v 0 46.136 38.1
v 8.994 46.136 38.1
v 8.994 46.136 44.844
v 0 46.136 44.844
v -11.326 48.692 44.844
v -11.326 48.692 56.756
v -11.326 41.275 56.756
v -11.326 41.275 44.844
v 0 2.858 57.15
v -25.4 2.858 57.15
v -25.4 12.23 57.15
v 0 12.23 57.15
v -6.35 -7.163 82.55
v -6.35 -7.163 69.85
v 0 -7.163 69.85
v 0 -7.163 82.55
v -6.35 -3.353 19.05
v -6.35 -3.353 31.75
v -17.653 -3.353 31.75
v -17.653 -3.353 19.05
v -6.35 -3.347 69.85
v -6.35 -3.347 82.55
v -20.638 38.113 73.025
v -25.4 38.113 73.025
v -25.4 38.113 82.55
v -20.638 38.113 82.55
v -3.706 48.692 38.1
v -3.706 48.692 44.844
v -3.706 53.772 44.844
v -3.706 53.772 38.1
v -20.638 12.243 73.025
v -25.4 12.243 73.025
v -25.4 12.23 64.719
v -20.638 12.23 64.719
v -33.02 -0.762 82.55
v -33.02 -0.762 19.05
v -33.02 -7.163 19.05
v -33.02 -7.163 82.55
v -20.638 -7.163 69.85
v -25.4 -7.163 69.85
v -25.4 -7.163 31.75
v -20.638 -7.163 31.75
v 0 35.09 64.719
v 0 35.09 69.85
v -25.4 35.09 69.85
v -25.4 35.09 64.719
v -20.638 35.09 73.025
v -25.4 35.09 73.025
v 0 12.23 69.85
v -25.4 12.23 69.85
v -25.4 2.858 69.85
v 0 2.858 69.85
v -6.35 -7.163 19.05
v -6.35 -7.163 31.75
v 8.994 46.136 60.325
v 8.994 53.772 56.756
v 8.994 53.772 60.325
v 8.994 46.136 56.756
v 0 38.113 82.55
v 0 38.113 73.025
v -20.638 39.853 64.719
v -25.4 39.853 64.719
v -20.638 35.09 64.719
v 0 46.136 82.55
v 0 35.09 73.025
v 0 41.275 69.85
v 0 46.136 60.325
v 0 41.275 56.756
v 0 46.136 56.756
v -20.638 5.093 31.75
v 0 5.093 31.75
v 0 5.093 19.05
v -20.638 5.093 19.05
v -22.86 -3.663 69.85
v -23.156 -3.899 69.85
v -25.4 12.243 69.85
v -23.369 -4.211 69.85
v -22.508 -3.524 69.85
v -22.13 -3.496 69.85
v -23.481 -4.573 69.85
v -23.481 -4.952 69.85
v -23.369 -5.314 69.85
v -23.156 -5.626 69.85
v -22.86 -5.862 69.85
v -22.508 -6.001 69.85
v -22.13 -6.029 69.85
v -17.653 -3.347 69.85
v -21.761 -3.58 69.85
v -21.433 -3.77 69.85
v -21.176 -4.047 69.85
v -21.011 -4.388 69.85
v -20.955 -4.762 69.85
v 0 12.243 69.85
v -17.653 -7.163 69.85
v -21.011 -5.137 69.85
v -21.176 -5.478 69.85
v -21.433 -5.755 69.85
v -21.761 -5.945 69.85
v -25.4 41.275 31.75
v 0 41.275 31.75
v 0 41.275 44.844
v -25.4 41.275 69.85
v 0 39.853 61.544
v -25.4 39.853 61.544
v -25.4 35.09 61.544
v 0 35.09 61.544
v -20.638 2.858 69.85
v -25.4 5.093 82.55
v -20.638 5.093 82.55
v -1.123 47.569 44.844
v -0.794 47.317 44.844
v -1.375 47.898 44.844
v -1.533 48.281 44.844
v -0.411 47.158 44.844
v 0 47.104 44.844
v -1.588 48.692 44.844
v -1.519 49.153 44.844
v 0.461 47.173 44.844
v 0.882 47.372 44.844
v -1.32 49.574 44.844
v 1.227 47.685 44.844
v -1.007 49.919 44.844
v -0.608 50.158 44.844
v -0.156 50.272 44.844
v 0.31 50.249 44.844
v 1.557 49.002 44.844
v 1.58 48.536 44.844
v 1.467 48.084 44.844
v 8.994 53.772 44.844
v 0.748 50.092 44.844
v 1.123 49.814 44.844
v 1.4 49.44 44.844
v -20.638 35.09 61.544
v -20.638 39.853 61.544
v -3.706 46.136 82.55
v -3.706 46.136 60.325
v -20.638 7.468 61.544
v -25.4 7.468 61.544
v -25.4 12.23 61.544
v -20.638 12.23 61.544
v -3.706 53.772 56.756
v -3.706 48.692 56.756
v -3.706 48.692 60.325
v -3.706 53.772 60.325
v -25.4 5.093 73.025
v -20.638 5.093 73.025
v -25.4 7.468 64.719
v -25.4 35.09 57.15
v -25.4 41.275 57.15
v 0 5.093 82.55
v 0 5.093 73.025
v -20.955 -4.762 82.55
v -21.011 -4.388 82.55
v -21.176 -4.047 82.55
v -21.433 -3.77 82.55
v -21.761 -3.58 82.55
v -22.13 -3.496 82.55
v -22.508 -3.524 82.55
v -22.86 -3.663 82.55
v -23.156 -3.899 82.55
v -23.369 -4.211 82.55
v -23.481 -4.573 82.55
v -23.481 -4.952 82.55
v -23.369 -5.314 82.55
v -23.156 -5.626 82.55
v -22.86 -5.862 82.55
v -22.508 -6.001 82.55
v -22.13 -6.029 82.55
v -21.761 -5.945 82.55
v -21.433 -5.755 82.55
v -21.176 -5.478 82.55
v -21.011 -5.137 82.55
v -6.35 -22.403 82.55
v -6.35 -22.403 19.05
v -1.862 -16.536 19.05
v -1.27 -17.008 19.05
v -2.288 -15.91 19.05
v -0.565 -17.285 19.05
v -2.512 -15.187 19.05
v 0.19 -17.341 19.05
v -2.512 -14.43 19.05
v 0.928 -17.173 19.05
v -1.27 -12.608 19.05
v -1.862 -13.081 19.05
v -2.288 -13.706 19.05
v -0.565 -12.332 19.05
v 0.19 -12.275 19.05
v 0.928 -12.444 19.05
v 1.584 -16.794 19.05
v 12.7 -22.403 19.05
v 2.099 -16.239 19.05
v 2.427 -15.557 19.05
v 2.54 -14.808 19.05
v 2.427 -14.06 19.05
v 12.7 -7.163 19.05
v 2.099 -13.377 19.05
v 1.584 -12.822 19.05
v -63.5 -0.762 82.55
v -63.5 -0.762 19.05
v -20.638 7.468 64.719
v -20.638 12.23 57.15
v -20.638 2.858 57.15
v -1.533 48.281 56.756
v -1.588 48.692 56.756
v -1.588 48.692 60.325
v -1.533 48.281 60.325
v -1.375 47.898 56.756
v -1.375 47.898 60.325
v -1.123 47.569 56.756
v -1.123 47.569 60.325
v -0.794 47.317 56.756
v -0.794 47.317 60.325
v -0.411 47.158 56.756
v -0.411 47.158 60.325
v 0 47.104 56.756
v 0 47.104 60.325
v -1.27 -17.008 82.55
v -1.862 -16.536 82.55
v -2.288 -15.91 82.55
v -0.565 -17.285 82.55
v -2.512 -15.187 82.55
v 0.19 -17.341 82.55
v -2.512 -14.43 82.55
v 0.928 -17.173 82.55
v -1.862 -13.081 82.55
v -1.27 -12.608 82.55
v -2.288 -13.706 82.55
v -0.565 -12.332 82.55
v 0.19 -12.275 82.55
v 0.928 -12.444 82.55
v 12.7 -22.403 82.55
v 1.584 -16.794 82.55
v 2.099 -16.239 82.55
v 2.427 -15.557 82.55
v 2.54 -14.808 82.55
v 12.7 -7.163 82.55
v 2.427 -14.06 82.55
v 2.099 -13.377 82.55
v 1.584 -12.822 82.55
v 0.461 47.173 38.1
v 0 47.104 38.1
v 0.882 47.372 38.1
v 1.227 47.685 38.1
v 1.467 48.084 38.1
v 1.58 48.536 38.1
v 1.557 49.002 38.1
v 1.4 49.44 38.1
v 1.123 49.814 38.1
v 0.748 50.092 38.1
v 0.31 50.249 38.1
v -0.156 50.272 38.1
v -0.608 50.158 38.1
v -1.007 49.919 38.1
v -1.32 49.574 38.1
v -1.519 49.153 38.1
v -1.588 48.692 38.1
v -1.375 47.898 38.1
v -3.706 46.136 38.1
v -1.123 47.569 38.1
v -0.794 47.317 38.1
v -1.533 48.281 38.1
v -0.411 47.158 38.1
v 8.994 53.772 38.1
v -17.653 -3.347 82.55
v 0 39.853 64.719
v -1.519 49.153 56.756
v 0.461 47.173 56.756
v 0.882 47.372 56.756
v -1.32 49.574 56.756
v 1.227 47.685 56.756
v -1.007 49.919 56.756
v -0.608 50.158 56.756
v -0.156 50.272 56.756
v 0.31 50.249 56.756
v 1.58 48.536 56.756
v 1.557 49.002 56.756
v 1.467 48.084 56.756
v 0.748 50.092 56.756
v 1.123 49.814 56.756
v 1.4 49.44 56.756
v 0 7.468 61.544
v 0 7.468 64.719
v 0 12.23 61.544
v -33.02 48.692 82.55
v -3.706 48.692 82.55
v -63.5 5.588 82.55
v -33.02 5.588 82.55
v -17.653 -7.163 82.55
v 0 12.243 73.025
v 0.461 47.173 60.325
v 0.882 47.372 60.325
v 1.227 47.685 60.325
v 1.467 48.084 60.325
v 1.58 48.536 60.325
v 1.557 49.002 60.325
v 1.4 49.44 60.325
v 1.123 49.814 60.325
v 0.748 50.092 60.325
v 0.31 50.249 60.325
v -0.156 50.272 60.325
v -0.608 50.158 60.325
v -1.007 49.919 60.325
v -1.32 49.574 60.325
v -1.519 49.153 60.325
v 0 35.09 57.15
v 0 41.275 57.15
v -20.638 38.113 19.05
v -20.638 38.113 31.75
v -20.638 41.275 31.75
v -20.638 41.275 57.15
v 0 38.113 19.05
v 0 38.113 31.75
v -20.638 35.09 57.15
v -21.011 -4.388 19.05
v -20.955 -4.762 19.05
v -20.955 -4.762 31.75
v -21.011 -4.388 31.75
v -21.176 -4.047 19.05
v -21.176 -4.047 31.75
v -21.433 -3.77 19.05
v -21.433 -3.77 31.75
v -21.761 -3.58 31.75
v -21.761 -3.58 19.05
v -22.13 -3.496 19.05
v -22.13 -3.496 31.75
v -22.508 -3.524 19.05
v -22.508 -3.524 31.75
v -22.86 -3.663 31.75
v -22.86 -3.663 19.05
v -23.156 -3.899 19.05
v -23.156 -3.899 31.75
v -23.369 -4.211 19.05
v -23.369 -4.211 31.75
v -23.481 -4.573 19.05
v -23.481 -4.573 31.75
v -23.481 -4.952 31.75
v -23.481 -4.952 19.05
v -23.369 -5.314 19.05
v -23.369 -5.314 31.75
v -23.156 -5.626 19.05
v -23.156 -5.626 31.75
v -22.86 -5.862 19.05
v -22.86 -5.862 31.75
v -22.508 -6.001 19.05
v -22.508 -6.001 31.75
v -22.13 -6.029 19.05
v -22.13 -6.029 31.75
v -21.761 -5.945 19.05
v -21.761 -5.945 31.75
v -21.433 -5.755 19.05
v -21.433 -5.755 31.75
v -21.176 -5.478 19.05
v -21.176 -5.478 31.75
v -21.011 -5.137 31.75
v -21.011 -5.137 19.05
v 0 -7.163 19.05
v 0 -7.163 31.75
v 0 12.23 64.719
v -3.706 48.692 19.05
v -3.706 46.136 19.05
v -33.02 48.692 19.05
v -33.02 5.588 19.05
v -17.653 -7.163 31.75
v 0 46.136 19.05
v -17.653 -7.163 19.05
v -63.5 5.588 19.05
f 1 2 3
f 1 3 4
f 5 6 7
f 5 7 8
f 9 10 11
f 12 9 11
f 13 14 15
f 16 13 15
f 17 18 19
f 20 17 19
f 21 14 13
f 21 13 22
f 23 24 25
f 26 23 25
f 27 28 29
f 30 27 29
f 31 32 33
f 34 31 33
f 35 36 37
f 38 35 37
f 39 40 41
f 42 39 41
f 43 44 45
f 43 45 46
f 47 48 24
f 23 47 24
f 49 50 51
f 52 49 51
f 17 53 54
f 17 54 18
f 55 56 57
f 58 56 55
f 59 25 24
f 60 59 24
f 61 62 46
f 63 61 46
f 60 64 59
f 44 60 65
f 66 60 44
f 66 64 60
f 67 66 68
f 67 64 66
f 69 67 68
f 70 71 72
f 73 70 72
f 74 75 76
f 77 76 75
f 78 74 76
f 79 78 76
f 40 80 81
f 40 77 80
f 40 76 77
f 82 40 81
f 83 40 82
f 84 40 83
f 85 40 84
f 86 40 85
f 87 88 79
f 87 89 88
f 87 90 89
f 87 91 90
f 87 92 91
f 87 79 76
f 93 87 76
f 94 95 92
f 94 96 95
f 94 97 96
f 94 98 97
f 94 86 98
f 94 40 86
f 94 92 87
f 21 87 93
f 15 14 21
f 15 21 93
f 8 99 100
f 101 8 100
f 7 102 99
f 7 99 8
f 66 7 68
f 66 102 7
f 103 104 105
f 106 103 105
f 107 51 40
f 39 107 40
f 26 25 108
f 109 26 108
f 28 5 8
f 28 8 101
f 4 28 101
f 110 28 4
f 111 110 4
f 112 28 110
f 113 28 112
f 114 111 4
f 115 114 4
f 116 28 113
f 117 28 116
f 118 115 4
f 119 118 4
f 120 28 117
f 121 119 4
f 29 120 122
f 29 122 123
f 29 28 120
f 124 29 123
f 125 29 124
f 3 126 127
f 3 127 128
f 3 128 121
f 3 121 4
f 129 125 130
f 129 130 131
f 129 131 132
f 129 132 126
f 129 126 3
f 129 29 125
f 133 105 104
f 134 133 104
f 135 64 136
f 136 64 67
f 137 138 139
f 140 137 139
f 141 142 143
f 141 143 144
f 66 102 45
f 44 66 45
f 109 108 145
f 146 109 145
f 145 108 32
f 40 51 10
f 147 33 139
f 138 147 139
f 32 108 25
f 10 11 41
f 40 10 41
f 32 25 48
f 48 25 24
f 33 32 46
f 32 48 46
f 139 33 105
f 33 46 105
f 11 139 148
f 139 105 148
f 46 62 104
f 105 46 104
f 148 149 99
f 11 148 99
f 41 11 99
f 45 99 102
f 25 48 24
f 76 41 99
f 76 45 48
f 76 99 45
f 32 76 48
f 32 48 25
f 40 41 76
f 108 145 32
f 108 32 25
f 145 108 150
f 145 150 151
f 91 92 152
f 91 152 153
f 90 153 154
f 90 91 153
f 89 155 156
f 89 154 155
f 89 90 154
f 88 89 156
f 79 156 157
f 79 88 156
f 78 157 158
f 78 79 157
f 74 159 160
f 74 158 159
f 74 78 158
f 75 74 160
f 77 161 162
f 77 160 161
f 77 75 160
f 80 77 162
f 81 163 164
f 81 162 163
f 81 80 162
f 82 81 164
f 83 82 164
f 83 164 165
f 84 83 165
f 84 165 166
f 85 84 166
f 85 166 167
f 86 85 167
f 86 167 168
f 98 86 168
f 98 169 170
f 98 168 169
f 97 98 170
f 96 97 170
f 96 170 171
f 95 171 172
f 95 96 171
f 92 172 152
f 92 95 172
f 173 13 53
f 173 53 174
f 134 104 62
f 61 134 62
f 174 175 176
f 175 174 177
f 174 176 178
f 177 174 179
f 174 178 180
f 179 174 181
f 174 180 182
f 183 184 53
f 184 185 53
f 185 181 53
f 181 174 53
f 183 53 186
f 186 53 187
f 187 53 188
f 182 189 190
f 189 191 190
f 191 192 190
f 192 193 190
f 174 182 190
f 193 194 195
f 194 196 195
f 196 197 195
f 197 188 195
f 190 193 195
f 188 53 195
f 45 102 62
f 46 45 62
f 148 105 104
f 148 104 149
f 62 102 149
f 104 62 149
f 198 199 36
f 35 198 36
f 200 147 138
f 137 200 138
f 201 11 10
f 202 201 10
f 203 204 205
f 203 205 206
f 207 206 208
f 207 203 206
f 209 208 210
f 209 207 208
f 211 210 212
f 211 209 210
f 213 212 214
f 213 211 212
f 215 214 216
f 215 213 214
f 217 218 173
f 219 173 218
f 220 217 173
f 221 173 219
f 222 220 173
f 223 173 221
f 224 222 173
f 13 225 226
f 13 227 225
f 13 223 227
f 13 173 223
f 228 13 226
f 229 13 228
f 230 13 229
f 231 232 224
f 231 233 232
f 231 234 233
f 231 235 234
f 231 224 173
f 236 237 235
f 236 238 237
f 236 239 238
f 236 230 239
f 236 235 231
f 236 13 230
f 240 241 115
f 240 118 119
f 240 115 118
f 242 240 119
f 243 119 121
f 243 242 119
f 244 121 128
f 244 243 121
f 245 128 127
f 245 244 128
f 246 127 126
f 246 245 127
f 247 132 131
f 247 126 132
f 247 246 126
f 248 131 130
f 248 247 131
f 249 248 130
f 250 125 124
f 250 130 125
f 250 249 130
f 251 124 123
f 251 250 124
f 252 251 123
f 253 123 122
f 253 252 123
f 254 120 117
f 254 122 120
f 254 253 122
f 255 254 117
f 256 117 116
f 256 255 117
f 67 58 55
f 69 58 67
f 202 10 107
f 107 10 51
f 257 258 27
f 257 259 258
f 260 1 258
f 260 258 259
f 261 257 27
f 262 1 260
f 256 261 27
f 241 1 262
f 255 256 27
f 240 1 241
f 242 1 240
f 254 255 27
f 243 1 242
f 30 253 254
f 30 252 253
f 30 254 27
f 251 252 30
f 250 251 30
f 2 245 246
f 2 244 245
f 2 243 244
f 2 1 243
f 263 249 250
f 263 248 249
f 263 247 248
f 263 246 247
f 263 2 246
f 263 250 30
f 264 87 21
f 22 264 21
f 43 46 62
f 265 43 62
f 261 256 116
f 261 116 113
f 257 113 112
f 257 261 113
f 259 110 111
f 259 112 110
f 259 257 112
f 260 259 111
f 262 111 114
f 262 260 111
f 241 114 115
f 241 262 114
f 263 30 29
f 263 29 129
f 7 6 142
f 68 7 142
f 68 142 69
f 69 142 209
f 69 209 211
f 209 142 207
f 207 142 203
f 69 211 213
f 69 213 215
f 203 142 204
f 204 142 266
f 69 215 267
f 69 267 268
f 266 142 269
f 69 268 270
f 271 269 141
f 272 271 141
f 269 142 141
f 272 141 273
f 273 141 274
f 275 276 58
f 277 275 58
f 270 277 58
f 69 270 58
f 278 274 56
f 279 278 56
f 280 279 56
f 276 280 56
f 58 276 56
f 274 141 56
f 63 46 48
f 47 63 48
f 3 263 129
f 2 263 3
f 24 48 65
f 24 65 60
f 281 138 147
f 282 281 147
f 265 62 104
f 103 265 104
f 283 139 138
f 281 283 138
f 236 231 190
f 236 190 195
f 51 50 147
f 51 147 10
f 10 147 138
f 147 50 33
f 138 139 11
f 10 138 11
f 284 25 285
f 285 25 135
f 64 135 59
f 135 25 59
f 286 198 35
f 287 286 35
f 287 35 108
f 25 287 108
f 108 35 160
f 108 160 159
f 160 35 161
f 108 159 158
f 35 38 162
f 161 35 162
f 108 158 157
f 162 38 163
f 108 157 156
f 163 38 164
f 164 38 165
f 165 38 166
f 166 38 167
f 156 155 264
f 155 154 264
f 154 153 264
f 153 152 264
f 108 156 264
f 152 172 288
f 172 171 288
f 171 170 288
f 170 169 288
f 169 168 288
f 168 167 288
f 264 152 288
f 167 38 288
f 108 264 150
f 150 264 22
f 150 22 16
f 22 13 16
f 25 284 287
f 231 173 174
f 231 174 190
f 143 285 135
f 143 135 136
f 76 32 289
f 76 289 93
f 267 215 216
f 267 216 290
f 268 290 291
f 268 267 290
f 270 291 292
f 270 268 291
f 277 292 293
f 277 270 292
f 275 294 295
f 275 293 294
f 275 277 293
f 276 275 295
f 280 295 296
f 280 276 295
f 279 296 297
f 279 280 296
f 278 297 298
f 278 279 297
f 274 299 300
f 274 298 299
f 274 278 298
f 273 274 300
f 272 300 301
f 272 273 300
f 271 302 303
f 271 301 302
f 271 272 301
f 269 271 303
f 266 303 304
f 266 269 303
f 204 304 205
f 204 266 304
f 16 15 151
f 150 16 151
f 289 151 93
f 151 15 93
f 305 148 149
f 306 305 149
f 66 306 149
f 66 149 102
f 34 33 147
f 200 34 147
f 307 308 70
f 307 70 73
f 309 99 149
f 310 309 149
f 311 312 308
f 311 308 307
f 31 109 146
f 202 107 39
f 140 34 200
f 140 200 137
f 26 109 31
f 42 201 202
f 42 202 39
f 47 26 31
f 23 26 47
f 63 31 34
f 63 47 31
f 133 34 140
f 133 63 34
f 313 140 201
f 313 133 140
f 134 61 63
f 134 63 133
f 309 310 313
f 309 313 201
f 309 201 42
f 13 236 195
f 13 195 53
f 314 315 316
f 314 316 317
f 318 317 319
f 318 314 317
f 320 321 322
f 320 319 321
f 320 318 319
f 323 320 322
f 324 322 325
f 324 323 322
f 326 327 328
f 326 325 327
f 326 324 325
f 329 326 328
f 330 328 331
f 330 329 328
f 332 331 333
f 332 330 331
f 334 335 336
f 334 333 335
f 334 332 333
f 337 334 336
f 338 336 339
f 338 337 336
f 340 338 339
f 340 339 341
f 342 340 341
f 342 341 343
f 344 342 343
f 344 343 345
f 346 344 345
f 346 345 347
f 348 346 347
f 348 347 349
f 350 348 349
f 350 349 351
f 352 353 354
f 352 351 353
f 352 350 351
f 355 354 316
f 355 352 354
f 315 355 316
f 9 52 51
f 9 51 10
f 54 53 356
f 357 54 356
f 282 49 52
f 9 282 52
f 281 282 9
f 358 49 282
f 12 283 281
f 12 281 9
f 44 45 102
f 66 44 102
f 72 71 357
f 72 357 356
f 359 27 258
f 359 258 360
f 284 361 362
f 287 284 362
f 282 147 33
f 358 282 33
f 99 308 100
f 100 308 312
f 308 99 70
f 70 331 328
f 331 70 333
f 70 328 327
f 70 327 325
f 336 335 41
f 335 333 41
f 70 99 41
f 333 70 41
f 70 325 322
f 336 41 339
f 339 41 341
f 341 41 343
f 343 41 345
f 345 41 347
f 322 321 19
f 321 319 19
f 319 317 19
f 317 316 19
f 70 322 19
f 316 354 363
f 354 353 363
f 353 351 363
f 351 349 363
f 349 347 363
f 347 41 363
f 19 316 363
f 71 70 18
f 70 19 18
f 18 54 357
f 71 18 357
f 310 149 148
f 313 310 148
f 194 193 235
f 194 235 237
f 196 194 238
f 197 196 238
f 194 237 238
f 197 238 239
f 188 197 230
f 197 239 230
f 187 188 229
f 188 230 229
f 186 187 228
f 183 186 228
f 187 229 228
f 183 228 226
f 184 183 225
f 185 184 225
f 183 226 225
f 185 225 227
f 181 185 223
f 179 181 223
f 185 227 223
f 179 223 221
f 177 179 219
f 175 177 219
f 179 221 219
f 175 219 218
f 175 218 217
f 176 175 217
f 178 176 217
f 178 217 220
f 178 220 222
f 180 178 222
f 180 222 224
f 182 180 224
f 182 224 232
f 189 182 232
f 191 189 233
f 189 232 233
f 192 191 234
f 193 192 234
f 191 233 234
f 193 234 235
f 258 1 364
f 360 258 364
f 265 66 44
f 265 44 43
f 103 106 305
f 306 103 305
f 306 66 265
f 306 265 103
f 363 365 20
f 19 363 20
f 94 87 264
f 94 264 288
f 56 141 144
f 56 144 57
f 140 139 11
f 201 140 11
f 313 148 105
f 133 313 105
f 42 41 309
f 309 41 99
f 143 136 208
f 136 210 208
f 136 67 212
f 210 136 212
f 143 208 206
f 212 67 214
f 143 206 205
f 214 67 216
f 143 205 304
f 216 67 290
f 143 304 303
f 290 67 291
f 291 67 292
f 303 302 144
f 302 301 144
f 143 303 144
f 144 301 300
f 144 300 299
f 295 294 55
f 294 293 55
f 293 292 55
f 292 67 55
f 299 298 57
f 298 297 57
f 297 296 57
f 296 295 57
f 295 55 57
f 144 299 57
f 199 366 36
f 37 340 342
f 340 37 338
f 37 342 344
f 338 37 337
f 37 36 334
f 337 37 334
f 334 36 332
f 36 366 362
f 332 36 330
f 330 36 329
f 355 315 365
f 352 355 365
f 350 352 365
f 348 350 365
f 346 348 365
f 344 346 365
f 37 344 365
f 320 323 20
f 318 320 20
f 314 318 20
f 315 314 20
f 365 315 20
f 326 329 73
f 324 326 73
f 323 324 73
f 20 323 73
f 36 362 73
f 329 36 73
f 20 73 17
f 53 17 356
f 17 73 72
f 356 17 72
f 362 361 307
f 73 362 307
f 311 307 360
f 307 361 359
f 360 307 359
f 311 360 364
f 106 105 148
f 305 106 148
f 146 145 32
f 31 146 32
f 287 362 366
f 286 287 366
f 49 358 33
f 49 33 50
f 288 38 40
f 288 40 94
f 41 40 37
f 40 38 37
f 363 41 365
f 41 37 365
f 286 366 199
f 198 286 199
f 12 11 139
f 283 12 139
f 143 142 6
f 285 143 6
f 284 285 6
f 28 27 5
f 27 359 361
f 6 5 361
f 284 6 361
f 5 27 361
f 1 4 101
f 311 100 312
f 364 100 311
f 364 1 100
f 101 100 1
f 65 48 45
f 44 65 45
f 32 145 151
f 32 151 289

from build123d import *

# Parameters (mm, degrees)
SKETCH8_R                = 1.27
BOSS_EXTRUDE3_DEPTH      = 101.6
SKETCH40_W               = 25.4
SKETCH40_H               = 38.1
CUT_EXTRUDE24_DEPTH      = 50.8
CUT_EXTRUDE11_DEPTH      = 130.327883255
CUT_EXTRUDE11_DEPTH_BACK = 101.6
SKETCH18_W               = 33.02
SKETCH18_H               = 2.3622
BOSS_EXTRUDE4_DEPTH      = 101.6
CUT_EXTRUDE12_START      = -101.6
SKETCH20_R               = 1.5875
CUT_EXTRUDE12_DEPTH      = 101.6
SKETCH21_W               = 33.02
SKETCH21_H               = 19.05
CUT_EXTRUDE13_DEPTH      = 135.416648809
SKETCH24_W               = 8.993546066
SKETCH24_H               = 19.05
CUT_EXTRUDE15_DEPTH      = 135.416648809
SKETCH38_W               = 11.9126
SKETCH38_H               = 7.635884817
CUT_EXTRUDE21_DEPTH      = 20.32
SKETCH41_W               = 30.48
SKETCH41_H               = 19.05
CUT_EXTRUDE25_DEPTH      = 130.137479387
SKETCH43_W               = 12.7
SKETCH43_H               = 33.02
CUT_EXTRUDE26_DEPTH      = 25.4
SKETCH44_W               = 3.175
SKETCH44_H               = 3.0226
SKETCH44_H_2             = 7.1501
BOSS_EXTRUDE5_DEPTH      = 25.4
BOSS_EXTRUDE6_DEPTH      = 25.4
BOSS_EXTRUDE6_2_DEPTH    = 25.4
SKETCH46_R               = 2.54
BOSS_EXTRUDE7_DEPTH      = 63.5
CUT_EXTRUDE29_DEPTH      = 105.670466108
CUT_EXTRUDE29_DEPTH_BACK = 12.7
SKETCH49_W               = 11.303
SKETCH49_H               = 3.81
CUT_EXTRUDE31_DEPTH      = 12.7
SKETCH50_W               = 11.326453934
SKETCH50_H               = 11.9126
CUT_EXTRUDE33_DEPTH      = 4.8768
BOSS_EXTRUDE8_DEPTH      = 4.7625
SKETCH53_W               = 22.225
SKETCH53_H               = 7.635884817
CUT_EXTRUDE34_DEPTH      = 12.7
SKETCH54_W               = 19.05
SKETCH54_H               = 7.635884817
CUT_EXTRUDE35_DEPTH      = 12.7
SKETCH56_W               = 12.7
SKETCH56_H               = 33.02
CUT_EXTRUDE36_DEPTH      = 20.6375


with BuildPart() as part:
    # Sketch8 → Boss-Extrude3 (new body)
    with BuildSketch(Plane.XY):
        Polygon((0, 0), (0, 48.6918), (-33.02, 48.6918), (-33.02, 5.588), (-63.5, 5.588), (-63.5, -0.762), (-33.02, -0.762), (-33.02, -9.525), (-9.525, -9.525), (0, -9.525), align=None)
        with Locations((-15.875, 28.5877)):
            Circle(SKETCH8_R, mode=Mode.SUBTRACT)
        with Locations((-22.225, -4.7625)):
            Circle(SKETCH8_R, mode=Mode.SUBTRACT)
    extrude(amount=BOSS_EXTRUDE3_DEPTH)

    # Sketch40 → Cut-Extrude24 (cut)
    with BuildSketch(Plane.XZ.offset(9.525)):
        with Locations((-12.7, 50.8)):
            Rectangle(SKETCH40_W, SKETCH40_H)
    extrude(amount=-CUT_EXTRUDE24_DEPTH, mode=Mode.SUBTRACT)

    # Sketch18 → Cut-Extrude11 (cut, two sides: drawn at the far end of the back side and taken through both)
    with BuildSketch(Plane.XY.offset(101.6).offset(-CUT_EXTRUDE11_DEPTH_BACK)):
        with Locations((-16.51, -8.3439)):
            Rectangle(SKETCH18_W, SKETCH18_H)
    extrude(amount=CUT_EXTRUDE11_DEPTH + CUT_EXTRUDE11_DEPTH_BACK, mode=Mode.SUBTRACT)

    # Sketch19 → Boss-Extrude4 (add)
    with BuildSketch(Plane(origin=(0, 0, 0), x_dir=(-1, 0, 0), z_dir=(0, 0, -1))):
        with BuildLine():
            Line((1.5875, 48.6918), (3.706453934, 48.6918))
            Line((3.706453934, 48.6918), (3.706453934, 53.7718))
            Line((3.706453934, 53.7718), (-8.993546066, 53.7718))
            Line((-8.993546066, 53.7718), (-8.993546066, 46.135915183))
            Line((-8.993546066, 46.135915183), (0, 46.135915183))
            Line((0, 46.135915183), (0, 47.1043))
            ThreePointArc((0, 47.1043), (-1.122532015, 49.814332015), (1.5875, 48.6918))
        make_face()
    extrude(amount=-BOSS_EXTRUDE4_DEPTH)

    # Sketch20 → Cut-Extrude12 (cut)
    with BuildSketch(Plane.XY.offset(101.6).offset(CUT_EXTRUDE12_START)):
        with Locations(Location((0, 48.6918, 0), (0, 0, 180))):
            Circle(SKETCH20_R)
    extrude(amount=CUT_EXTRUDE12_DEPTH, mode=Mode.SUBTRACT)

    # Sketch21 → Cut-Extrude13 (cut, through all)
    with BuildSketch(Plane.XZ.offset(7.1628)):
        with Locations((-16.51, 92.075)):
            Rectangle(SKETCH21_W, SKETCH21_H)
        with Locations((-16.51, 9.525)):
            Rectangle(SKETCH21_W, SKETCH21_H)
    extrude(amount=-CUT_EXTRUDE13_DEPTH, mode=Mode.SUBTRACT)

    # Sketch24 → Cut-Extrude15 (cut, through all)
    with BuildSketch(Plane(origin=(0, 53.7718, 0), x_dir=(1, 0, 0), z_dir=(0, 1, 0))):
        with Locations((4.496773033, -92.075)):
            Rectangle(SKETCH24_W, SKETCH24_H)
        with Locations((4.496773033, -9.525)):
            Rectangle(SKETCH24_W, SKETCH24_H)
    extrude(amount=-CUT_EXTRUDE15_DEPTH, mode=Mode.SUBTRACT)

    # Sketch38 → Cut-Extrude21 (cut)
    with BuildSketch(Plane(origin=(8.993546066, 0, 0), x_dir=(0, 0, -1), z_dir=(1, 0, 0))):
        with Locations((-50.8, 49.953857592)):
            Rectangle(SKETCH38_W, SKETCH38_H)
    extrude(amount=-CUT_EXTRUDE21_DEPTH, mode=Mode.SUBTRACT)

    # Sketch41 → Cut-Extrude25 (cut, through all)
    with BuildSketch(Plane(origin=(0, 5.588, 0), x_dir=(1, 0, 0), z_dir=(0, 1, 0))):
        with Locations((-48.26, -9.525)):
            Rectangle(SKETCH41_W, SKETCH41_H)
        with Locations((-48.26, -92.075)):
            Rectangle(SKETCH41_W, SKETCH41_H)
    extrude(amount=-CUT_EXTRUDE25_DEPTH, mode=Mode.SUBTRACT)

    # Sketch43 → Cut-Extrude26 (cut)
    with BuildSketch(Plane(origin=(0, 0, 0), x_dir=(0, 0, -1), z_dir=(1, 0, 0))):
        with Locations((-76.2, 21.6027)):
            Rectangle(SKETCH43_W, SKETCH43_H)
    extrude(amount=-CUT_EXTRUDE26_DEPTH, mode=Mode.SUBTRACT)

    # Sketch44 → Boss-Extrude5 (add)
    with BuildSketch(Plane(origin=(-25.4, 0, 0), x_dir=(0, 0, -1), z_dir=(1, 0, 0))):
        with Locations((-71.4375, 36.6014)):
            Rectangle(SKETCH44_W, SKETCH44_H)
        with Locations((-71.4375, 8.66775)):
            Rectangle(SKETCH44_W, SKETCH44_H_2)
    extrude(amount=BOSS_EXTRUDE5_DEPTH)

    # Sketch48 → Cut-Extrude29 (cut, two sides: drawn at the far end of the back side and taken through both)
    with BuildSketch(Plane.XY.offset(82.55).offset(-CUT_EXTRUDE29_DEPTH_BACK)):
        Polygon((-17.653, -184.245390082), (-17.653, -7.1628), (-17.653, -3.346799078), (-6.35, -3.346799078), (-6.35, -7.1628), (-6.35, -184.245390082), (-6.35, -538.410570247), (-17.653, -538.410570247), align=None)
    extrude(amount=CUT_EXTRUDE29_DEPTH + CUT_EXTRUDE29_DEPTH_BACK, mode=Mode.SUBTRACT)

    # Sketch49 → Cut-Extrude31 (cut)
    with BuildSketch(Plane(origin=(0, 0, 19.05), x_dir=(-1, 0, 0), z_dir=(0, 0, -1))):
        with Locations((12.0015, -5.2578)):
            Rectangle(SKETCH49_W, SKETCH49_H)
    extrude(amount=-CUT_EXTRUDE31_DEPTH, mode=Mode.SUBTRACT)

    # Sketch50 → Cut-Extrude33 (cut)
    with BuildSketch(Plane(origin=(0, 46.135915183, 0), x_dir=(1, 0, 0), z_dir=(0, 1, 0))):
        with Locations((-5.663226967, -50.8)):
            Rectangle(SKETCH50_W, SKETCH50_H)
    extrude(amount=-CUT_EXTRUDE33_DEPTH, mode=Mode.SUBTRACT)

    # Sketch53 → Cut-Extrude34 (cut)
    with BuildSketch(Plane(origin=(8.993546066, 0, 0), x_dir=(0, 0, -1), z_dir=(1, 0, 0))):
        with Locations((-71.4375, 49.953857592)):
            Rectangle(SKETCH53_W, SKETCH53_H)
    extrude(amount=-CUT_EXTRUDE34_DEPTH, mode=Mode.SUBTRACT)

    # Sketch54 → Cut-Extrude35 (cut)
    with BuildSketch(Plane(origin=(8.993546066, 0, 0), x_dir=(0, 0, -1), z_dir=(1, 0, 0))):
        with Locations((-28.575, 49.953857592)):
            Rectangle(SKETCH54_W, SKETCH54_H)
    extrude(amount=-CUT_EXTRUDE35_DEPTH, mode=Mode.SUBTRACT)

    # Sketch56 → Cut-Extrude36 (cut)
    with BuildSketch(Plane(origin=(0, 0, 0), x_dir=(0, 0, -1), z_dir=(1, 0, 0))):
        with Locations((-25.4, 21.6027)):
            Rectangle(SKETCH56_W, SKETCH56_H)
    extrude(amount=-CUT_EXTRUDE36_DEPTH, mode=Mode.SUBTRACT)


with BuildPart() as body_2:
    # Sketch45 → Boss-Extrude6 (new body)
    with BuildSketch(Plane(origin=(-25.4, 0, 0), x_dir=(0, 0, -1), z_dir=(1, 0, 0))):
        Polygon((-57.15, 2.8575), (-57.15, 12.2301), (-61.5442, 12.2301), (-61.5442, 7.4676), (-64.7192, 7.4676), (-64.7192, 12.2301), (-69.85, 12.2301), (-69.85, 2.8575), align=None)
    extrude(amount=BOSS_EXTRUDE6_DEPTH)


with BuildPart() as body_3:
    # Sketch45 → Boss-Extrude6 2 (new body)
    with BuildSketch(Plane(origin=(-25.4, 0, 0), x_dir=(0, 0, -1), z_dir=(1, 0, 0))):
        Polygon((-57.15, 35.0901), (-57.15, 41.275), (-69.85, 41.275), (-69.85, 35.0901), (-64.7192, 35.0901), (-64.7192, 39.8526), (-61.5442, 39.8526), (-61.5442, 35.0901), align=None)
    extrude(amount=BOSS_EXTRUDE6_2_DEPTH)


with BuildPart() as body_4:
    # Sketch46 → Boss-Extrude7 (new body)
    with BuildSketch(Plane.XY.offset(82.55)):
        Polygon((12.7, -7.1628), (0, -7.1628), (-6.35, -7.1628), (-6.35, -22.4028), (12.7, -22.4028), align=None)
        with Locations((0, -14.8082)):
            Circle(SKETCH46_R, mode=Mode.SUBTRACT)
    extrude(amount=-BOSS_EXTRUDE7_DEPTH)


with BuildPart() as body_5:
    # Sketch52 → Boss-Extrude8 (new body)
    with BuildSketch(Plane(origin=(-25.4, 0, 0), x_dir=(0, 0, -1), z_dir=(1, 0, 0))):
        Polygon((-73.025, 38.1127), (-82.55, 38.1127), (-82.55, 5.0927), (-73.025, 5.0927), (-73.025, 12.2428), (-64.7192, 12.2301), (-64.7192, 7.4676), (-61.5442, 7.4676), (-61.5442, 12.2301), (-57.15, 12.2301), (-57.15, 2.8575), (-69.85, 2.8575), (-69.85, -7.1628), (-31.75, -7.1628), (-31.75, 41.275), (-57.15, 41.275), (-57.15, 35.0901), (-61.5442, 35.0901), (-61.5442, 39.8526), (-64.7192, 39.8526), (-64.7192, 35.0901), (-73.025, 35.0901), align=None)
    extrude(amount=BOSS_EXTRUDE8_DEPTH)


solid = Compound([part.part, body_2.part, body_3.part, body_4.part, body_5.part])
